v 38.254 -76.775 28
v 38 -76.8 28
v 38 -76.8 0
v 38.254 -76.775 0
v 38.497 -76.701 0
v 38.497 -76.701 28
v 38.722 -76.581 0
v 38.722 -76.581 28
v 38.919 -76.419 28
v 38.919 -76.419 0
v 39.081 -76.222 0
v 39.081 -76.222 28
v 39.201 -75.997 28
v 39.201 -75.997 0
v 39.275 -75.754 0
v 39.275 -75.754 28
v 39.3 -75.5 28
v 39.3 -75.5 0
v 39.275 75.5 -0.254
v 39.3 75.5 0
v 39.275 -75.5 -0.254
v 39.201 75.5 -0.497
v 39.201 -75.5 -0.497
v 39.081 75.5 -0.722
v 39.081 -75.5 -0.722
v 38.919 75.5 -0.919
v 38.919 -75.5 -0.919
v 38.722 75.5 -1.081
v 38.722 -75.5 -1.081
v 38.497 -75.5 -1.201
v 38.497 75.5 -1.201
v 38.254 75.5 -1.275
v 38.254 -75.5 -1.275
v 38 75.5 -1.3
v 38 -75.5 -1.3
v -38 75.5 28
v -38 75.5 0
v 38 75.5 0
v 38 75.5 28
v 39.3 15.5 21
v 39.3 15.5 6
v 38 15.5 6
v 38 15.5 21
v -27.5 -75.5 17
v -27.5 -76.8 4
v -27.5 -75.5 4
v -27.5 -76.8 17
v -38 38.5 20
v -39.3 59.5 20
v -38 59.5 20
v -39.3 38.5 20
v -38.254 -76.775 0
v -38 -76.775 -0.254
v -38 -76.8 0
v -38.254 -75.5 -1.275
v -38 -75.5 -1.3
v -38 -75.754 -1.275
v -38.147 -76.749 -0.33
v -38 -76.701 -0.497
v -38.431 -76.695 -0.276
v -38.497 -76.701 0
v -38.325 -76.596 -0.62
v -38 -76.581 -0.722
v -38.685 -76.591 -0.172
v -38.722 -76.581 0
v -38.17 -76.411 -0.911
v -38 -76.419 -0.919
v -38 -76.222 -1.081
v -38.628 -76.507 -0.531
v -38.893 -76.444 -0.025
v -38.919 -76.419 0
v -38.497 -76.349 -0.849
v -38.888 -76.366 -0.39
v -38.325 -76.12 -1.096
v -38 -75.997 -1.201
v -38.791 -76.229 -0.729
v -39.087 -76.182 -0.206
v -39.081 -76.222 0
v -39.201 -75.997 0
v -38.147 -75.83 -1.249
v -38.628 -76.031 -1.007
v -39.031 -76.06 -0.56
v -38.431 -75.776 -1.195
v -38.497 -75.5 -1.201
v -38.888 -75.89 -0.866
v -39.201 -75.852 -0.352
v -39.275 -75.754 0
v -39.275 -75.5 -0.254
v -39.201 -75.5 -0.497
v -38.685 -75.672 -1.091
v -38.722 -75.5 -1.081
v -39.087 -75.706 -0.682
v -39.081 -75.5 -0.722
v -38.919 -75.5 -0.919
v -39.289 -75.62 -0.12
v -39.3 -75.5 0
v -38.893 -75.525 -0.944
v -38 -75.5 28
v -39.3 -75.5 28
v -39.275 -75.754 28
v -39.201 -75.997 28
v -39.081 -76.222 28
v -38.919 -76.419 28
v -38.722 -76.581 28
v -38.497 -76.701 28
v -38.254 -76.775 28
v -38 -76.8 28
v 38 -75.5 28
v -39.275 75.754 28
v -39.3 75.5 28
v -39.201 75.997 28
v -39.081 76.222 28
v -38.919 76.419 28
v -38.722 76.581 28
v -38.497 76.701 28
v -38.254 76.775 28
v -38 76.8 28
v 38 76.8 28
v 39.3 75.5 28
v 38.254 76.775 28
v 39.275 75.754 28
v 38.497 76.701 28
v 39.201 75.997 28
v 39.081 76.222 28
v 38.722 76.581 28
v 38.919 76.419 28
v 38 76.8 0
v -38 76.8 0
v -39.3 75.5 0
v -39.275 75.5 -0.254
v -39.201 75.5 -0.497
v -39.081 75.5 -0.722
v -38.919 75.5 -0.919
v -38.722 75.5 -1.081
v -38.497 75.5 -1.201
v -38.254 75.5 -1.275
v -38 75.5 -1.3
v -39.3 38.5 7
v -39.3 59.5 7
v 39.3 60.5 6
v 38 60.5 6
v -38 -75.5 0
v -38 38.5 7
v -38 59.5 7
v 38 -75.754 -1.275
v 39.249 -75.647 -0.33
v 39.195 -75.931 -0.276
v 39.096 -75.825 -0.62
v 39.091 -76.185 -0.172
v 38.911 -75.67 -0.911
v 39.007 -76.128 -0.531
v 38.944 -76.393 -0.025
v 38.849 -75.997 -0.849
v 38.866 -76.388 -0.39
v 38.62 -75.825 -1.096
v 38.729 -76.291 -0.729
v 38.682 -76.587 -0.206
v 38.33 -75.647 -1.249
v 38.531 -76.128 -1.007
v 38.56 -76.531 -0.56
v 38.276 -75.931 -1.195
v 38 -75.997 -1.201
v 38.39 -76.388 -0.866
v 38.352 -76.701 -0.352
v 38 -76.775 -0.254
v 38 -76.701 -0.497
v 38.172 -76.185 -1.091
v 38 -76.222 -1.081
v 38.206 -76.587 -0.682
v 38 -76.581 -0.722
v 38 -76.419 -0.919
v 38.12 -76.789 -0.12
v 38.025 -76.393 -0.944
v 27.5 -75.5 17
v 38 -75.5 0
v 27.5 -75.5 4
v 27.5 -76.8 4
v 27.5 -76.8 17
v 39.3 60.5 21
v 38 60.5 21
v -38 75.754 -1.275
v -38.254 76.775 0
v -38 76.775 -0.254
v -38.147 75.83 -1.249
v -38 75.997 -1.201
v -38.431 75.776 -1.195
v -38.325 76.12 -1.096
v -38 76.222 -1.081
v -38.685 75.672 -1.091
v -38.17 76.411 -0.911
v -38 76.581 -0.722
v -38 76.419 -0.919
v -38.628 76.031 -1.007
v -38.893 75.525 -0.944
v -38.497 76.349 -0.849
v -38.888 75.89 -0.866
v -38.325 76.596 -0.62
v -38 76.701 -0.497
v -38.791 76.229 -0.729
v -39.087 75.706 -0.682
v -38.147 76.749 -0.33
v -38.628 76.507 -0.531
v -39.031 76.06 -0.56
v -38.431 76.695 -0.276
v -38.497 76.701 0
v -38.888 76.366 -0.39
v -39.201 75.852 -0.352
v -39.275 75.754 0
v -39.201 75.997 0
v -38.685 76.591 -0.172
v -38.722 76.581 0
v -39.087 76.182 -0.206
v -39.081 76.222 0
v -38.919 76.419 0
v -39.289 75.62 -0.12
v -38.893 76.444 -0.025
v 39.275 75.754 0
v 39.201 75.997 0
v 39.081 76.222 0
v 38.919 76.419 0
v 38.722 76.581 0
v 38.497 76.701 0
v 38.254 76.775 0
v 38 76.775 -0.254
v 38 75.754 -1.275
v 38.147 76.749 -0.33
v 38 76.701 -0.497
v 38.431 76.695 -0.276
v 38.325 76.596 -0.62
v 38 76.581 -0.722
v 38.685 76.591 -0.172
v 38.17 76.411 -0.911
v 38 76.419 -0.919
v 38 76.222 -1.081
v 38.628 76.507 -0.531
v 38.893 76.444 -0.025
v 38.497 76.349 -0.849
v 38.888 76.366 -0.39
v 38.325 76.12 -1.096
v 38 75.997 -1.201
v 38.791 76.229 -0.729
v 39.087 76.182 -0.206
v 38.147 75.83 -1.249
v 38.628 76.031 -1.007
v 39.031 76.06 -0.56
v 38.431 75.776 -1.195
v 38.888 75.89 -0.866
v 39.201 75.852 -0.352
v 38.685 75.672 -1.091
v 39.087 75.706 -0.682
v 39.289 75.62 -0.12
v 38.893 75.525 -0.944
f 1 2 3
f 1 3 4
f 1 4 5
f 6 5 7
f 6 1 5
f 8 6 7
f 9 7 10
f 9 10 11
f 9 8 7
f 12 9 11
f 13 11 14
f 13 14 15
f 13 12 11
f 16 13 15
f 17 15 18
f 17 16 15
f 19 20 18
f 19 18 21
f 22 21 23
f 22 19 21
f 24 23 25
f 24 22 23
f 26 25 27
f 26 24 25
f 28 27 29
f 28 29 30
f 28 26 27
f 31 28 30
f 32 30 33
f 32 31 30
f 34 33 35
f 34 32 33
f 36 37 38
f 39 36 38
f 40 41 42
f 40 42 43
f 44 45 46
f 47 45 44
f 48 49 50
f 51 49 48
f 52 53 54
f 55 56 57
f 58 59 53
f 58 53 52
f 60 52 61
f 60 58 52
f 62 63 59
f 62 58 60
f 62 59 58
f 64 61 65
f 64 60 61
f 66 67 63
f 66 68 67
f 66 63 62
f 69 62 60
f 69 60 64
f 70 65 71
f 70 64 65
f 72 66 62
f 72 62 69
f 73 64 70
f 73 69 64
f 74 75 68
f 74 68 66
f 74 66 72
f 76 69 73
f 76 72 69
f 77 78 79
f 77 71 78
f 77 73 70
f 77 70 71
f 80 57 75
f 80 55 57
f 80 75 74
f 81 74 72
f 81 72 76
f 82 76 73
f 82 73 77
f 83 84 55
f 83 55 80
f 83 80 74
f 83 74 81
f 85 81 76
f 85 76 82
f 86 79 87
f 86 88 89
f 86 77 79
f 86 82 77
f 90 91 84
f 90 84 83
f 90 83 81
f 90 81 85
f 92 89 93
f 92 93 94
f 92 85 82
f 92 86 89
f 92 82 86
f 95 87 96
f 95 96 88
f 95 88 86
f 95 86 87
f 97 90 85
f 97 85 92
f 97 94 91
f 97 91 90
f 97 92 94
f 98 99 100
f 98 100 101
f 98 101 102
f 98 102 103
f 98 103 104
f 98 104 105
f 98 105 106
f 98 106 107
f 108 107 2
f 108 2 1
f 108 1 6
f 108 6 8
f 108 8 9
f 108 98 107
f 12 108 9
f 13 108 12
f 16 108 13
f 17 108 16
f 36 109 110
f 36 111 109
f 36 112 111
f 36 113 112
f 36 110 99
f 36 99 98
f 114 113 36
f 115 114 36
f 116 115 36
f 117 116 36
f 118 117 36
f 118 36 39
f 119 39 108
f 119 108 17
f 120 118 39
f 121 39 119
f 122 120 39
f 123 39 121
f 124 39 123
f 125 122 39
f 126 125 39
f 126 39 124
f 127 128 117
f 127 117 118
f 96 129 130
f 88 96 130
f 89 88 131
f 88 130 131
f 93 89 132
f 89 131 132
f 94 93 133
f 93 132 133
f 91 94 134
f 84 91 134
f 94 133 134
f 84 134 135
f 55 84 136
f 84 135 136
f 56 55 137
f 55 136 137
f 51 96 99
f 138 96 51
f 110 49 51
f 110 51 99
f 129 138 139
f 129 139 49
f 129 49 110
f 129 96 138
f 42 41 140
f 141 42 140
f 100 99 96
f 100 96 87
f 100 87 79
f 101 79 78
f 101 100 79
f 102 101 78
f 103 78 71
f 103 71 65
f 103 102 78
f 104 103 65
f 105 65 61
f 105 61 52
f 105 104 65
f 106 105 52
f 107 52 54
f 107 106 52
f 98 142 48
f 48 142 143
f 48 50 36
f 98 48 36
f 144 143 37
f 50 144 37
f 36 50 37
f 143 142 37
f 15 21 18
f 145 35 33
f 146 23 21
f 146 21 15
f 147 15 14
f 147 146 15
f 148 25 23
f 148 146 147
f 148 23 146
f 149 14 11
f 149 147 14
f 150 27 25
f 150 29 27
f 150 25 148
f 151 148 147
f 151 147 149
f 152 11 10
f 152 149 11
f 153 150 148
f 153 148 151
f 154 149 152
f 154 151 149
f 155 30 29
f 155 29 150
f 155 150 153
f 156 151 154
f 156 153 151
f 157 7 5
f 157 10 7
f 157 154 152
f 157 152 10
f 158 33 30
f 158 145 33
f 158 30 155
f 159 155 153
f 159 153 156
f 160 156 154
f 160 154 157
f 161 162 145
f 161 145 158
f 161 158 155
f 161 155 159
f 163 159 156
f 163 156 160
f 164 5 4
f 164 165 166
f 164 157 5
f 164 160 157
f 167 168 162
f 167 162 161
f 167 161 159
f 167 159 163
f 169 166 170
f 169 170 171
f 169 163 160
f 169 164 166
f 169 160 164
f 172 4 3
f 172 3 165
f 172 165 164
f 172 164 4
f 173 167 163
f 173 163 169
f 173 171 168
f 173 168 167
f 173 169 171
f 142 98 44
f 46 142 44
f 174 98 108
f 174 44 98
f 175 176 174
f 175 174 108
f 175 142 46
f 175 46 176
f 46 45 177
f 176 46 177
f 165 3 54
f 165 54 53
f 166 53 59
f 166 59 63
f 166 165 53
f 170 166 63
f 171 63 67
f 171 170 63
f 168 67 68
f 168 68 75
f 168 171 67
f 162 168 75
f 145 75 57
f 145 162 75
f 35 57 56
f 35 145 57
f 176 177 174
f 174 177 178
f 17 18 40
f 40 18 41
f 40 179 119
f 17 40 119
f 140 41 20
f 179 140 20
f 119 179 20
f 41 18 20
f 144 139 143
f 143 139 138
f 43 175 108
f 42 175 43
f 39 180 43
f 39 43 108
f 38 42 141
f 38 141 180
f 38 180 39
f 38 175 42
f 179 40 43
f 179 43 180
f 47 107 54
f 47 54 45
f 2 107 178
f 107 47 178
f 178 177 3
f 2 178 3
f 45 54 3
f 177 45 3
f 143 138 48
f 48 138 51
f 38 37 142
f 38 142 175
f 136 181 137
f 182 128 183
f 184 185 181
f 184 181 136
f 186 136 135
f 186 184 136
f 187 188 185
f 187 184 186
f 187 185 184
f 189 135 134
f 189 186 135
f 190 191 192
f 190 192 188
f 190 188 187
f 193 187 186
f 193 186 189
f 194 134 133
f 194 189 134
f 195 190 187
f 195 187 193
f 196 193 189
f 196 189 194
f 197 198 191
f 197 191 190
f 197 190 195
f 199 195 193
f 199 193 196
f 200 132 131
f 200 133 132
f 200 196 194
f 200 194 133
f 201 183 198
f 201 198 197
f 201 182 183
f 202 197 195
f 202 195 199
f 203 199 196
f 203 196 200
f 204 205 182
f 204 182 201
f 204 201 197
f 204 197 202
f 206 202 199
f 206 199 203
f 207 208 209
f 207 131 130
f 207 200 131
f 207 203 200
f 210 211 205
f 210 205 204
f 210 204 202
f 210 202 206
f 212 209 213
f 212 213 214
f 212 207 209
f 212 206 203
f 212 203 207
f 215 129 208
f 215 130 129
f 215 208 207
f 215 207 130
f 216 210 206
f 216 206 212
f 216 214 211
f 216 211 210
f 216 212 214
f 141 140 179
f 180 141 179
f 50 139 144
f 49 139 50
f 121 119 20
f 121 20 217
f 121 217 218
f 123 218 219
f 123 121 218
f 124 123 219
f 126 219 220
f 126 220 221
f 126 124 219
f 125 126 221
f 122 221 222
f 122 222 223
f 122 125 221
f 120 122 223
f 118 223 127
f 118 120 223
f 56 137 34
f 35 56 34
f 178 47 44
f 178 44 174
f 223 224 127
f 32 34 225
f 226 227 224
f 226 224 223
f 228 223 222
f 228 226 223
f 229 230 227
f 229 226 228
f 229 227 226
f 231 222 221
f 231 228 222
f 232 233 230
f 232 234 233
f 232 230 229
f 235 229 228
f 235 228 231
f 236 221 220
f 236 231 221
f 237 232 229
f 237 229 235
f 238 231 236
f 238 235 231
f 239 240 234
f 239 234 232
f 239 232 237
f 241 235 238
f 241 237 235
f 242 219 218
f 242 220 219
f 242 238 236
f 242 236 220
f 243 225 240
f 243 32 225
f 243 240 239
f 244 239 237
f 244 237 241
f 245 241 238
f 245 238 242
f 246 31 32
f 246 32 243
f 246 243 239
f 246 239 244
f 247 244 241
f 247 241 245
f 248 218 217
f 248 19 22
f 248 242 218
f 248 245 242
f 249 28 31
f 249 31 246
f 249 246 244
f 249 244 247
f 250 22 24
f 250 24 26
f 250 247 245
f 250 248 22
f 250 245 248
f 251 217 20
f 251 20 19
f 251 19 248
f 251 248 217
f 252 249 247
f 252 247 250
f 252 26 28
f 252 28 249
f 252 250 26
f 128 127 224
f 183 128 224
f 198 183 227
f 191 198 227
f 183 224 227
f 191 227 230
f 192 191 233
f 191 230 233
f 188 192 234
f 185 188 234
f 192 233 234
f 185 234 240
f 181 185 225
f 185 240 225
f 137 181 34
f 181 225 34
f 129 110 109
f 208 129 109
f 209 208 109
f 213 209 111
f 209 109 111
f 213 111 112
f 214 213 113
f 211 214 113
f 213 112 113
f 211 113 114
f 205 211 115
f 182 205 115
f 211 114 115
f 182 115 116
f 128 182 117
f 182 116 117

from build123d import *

# Parameters (mm, degrees)
SKETCH_W        = 76
SKETCH_H        = 151
PAD_DEPTH       = 28
THICKNESS_T     = 1.3
SKETCH001_W     = 55
SKETCH001_H     = 13
POCKET_DEPTH    = 5
SKETCH002_W     = 21
SKETCH002_H     = 13
POCKET001_DEPTH = 5
SKETCH003_W     = 45
SKETCH003_H     = 15
POCKET002_DEPTH = 5


with BuildPart() as part:
    # Sketch → Pad (new body)
    with BuildSketch(Plane.XY):
        Rectangle(SKETCH_W, SKETCH_H)
    extrude(amount=PAD_DEPTH)

    # Thickness
    thickness_openings = [part.faces().sort_by_distance(p)[0] for p in [
        (0, 0, 28),
    ]]
    offset(amount=THICKNESS_T, openings=thickness_openings)

    # Sketch001 (on Face12 of Thickness) → Pocket (cut)
    with BuildSketch(Plane.XZ.offset(76.8)):
        with Locations((0, 10.5)):
            Rectangle(SKETCH001_W, SKETCH001_H)
    extrude(amount=-POCKET_DEPTH, mode=Mode.SUBTRACT)

    # Sketch002 (on Face11 of Pocket) → Pocket001 (cut)
    with BuildSketch(Plane(origin=(-39.3, 0, 0), x_dir=(0, -1, 0), z_dir=(-1, 0, 0))):
        with Locations((-49, 13.5)):
            Rectangle(SKETCH002_W, SKETCH002_H)
    extrude(amount=-POCKET001_DEPTH, mode=Mode.SUBTRACT)

    # Sketch003 (on Face11 of Pocket001) → Pocket002 (cut)
    with BuildSketch(Plane.YZ.offset(39.3)):
        with Locations((38, 13.5)):
            Rectangle(SKETCH003_W, SKETCH003_H)
    extrude(amount=-POCKET002_DEPTH, mode=Mode.SUBTRACT)


solid = part.part
